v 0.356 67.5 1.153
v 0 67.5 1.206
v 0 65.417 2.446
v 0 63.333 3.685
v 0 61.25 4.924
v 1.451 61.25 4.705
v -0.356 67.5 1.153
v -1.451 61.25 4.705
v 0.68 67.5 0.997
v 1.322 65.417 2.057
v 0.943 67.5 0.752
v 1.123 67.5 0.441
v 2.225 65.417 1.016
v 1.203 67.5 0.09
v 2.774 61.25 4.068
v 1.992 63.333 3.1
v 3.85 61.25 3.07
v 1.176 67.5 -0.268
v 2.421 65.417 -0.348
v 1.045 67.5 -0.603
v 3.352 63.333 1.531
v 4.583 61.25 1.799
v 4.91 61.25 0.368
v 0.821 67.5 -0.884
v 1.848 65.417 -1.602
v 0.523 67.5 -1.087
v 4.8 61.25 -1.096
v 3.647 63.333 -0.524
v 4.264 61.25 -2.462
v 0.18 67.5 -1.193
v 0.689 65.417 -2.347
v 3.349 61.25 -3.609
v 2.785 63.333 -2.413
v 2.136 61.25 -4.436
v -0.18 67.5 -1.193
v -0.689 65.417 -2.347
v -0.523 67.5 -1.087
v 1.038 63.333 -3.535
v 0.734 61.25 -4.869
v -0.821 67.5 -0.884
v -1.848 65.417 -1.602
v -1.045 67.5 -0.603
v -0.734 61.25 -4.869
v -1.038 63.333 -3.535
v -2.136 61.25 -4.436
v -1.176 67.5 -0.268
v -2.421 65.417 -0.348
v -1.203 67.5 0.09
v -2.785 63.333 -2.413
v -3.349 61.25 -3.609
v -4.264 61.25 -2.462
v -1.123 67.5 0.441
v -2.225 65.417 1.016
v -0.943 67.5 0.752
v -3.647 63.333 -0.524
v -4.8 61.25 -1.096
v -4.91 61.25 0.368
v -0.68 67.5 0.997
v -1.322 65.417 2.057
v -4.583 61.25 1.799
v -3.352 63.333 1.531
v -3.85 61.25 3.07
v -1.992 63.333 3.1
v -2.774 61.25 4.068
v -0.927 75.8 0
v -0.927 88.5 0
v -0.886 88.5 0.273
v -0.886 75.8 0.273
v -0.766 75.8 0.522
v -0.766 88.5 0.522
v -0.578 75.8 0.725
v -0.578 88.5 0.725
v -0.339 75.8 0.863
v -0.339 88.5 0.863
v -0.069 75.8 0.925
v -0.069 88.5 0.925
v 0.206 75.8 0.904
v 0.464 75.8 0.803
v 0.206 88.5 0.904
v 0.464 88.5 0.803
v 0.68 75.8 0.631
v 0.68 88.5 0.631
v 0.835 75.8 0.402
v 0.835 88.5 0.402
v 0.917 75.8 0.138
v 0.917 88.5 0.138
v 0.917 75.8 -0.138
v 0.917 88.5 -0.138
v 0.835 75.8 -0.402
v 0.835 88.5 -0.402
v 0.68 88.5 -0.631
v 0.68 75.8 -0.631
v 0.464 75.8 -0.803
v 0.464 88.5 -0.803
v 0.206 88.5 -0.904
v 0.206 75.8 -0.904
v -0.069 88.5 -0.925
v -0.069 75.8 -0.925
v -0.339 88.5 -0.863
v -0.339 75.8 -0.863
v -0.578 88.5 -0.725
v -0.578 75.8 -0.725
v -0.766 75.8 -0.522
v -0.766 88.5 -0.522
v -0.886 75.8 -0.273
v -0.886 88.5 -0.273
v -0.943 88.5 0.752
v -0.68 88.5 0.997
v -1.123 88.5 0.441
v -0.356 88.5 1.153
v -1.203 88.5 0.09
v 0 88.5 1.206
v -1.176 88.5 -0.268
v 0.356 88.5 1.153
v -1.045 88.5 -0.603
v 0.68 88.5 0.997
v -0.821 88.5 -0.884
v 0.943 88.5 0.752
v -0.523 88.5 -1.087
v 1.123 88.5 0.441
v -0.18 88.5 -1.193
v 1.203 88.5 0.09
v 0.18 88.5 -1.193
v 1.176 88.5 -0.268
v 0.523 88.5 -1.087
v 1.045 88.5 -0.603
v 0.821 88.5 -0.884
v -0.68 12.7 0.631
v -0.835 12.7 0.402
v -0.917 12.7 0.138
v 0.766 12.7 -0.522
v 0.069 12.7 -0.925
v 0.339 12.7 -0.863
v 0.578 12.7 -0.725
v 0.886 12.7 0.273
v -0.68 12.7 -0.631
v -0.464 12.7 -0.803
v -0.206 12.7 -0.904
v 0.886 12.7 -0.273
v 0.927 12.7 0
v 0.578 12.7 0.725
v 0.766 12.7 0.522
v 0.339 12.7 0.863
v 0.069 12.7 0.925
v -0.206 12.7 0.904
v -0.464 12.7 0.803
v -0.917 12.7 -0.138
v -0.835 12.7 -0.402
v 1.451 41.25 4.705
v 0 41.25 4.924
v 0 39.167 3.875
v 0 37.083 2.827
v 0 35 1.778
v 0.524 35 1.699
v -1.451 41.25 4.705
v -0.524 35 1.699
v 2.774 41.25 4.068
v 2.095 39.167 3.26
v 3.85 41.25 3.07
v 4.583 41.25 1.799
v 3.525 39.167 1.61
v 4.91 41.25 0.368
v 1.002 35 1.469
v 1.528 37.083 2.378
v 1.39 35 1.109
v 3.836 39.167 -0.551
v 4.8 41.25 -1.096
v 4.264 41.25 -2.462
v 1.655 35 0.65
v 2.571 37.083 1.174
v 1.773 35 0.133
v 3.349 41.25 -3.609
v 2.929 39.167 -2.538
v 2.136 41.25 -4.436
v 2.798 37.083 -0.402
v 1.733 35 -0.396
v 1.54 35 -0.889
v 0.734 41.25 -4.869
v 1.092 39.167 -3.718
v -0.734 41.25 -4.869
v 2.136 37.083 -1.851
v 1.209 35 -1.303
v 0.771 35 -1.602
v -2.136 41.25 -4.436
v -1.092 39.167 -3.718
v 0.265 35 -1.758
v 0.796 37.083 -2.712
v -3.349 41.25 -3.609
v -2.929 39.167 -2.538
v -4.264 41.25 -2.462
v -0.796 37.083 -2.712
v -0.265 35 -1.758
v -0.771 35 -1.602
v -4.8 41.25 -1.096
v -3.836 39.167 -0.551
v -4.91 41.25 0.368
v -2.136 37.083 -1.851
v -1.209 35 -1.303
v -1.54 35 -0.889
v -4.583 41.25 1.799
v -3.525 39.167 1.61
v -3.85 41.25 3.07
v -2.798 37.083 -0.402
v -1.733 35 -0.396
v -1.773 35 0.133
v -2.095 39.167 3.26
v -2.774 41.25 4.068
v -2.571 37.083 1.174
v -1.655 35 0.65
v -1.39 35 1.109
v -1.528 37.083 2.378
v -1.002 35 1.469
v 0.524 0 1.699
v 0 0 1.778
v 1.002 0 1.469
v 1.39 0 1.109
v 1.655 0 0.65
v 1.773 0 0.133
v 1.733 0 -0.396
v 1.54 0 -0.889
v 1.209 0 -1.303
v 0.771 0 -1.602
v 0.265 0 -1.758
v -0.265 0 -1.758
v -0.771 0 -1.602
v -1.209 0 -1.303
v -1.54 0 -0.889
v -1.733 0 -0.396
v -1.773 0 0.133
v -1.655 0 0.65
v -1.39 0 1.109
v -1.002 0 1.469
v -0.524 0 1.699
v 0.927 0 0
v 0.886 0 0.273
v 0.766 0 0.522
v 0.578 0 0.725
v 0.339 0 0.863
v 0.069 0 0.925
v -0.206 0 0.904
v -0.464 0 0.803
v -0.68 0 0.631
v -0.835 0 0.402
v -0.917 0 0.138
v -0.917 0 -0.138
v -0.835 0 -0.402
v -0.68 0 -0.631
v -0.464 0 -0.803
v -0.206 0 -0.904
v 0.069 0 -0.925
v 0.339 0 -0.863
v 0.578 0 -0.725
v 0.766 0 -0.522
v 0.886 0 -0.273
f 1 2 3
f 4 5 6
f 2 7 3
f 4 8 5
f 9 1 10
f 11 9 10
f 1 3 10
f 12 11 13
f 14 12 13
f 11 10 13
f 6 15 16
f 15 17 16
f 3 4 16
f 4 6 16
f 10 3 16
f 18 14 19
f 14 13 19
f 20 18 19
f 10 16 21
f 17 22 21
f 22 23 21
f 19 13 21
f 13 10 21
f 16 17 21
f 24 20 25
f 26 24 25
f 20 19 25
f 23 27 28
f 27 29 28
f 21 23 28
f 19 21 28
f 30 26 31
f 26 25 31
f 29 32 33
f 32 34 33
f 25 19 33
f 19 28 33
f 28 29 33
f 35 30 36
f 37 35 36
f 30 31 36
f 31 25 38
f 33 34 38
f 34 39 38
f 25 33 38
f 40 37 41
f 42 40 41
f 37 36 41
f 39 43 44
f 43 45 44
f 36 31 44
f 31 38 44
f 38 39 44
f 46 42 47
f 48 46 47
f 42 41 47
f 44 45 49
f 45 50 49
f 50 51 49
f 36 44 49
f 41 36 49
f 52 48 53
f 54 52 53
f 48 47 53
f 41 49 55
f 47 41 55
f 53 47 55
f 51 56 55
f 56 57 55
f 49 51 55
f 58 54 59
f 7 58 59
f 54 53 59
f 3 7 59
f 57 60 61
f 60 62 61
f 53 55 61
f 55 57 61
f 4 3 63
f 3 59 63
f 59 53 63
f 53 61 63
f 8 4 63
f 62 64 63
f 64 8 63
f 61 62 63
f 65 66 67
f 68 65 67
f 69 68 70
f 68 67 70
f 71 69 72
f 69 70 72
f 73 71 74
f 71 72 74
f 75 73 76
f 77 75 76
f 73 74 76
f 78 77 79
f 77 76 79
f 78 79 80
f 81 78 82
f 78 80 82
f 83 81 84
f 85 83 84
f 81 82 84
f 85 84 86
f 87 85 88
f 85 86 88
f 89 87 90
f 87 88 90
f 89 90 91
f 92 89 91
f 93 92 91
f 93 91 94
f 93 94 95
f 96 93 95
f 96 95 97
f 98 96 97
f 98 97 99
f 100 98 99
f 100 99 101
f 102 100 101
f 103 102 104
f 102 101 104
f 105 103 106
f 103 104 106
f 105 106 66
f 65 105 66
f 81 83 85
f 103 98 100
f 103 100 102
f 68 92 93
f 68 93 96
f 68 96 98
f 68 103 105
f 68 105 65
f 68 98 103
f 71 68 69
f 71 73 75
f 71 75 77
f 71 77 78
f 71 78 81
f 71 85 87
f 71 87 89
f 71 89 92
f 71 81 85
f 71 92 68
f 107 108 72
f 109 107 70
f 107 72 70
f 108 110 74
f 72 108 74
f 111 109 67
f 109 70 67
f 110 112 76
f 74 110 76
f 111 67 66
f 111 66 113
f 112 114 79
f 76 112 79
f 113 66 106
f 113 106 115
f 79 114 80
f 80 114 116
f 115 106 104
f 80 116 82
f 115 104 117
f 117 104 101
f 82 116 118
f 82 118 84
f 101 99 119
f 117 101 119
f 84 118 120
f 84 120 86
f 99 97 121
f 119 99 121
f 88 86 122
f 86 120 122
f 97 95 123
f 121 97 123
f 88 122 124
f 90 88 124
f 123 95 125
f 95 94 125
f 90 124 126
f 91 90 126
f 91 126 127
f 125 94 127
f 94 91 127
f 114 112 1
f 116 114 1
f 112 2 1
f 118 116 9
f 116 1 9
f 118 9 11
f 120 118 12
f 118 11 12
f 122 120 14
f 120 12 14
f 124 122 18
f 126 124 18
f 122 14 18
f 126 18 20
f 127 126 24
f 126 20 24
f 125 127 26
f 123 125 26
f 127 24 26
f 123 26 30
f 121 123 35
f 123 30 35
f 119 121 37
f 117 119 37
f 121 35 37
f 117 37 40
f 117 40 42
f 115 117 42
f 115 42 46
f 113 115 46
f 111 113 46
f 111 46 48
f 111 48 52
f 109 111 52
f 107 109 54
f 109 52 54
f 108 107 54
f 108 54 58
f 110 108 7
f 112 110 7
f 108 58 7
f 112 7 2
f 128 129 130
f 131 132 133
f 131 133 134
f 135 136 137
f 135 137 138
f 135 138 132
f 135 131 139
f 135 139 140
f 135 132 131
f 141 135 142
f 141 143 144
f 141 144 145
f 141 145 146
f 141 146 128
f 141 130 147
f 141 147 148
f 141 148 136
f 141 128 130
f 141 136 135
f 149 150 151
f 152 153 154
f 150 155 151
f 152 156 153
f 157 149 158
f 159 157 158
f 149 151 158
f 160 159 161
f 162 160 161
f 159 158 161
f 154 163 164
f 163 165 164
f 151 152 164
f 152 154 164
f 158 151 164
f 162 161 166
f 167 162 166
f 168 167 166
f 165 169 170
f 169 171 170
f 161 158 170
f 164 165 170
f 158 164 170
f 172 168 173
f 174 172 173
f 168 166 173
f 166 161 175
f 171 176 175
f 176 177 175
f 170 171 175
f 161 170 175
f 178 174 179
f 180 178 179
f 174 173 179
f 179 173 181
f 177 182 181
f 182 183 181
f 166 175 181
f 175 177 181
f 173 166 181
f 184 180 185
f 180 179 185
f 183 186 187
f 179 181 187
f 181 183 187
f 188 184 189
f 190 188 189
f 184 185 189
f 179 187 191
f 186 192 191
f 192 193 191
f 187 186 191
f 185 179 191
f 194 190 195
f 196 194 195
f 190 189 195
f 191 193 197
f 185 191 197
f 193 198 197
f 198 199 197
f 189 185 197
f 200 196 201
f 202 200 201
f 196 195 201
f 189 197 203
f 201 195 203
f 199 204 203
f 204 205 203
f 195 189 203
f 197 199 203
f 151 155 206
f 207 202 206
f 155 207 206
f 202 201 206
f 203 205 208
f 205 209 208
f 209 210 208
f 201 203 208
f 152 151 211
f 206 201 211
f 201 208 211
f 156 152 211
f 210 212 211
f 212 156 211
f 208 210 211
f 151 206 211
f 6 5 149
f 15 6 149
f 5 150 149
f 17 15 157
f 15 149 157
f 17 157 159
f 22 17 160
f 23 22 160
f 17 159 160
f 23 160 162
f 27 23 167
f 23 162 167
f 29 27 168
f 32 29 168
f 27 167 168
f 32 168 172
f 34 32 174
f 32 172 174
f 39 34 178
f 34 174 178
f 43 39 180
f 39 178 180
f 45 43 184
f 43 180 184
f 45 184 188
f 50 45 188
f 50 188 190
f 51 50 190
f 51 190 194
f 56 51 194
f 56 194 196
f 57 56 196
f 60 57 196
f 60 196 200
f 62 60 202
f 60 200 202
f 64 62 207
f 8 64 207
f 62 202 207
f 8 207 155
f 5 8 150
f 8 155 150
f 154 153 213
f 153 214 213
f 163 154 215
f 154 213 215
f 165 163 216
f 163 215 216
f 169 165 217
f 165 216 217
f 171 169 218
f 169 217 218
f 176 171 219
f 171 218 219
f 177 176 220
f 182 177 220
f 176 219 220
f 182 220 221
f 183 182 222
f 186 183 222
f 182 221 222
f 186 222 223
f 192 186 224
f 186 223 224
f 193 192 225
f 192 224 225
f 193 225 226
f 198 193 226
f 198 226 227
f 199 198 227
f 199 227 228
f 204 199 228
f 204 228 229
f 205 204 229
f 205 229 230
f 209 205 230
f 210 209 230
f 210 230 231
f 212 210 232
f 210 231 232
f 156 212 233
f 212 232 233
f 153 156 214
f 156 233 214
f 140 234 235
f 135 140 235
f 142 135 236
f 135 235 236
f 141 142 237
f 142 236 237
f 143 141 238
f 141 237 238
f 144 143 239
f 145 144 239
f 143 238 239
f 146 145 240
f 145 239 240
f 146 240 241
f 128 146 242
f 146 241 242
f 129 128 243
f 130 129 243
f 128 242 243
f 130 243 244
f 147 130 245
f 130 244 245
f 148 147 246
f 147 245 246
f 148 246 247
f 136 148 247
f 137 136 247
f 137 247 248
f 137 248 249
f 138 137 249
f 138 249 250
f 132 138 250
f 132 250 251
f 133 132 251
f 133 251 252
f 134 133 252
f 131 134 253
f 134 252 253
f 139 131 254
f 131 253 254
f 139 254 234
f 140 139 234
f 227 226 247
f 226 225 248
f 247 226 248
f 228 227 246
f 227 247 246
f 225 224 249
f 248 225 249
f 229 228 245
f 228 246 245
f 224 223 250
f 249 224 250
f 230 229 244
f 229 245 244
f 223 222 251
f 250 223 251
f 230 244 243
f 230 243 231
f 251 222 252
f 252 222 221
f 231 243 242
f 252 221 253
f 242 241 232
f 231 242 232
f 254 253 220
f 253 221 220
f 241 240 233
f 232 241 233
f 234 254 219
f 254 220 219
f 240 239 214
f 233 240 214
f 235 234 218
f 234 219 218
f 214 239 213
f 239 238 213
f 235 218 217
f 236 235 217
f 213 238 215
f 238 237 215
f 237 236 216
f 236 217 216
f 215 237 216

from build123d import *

# Parameters (mm, degrees)
F2_R     = 0.9271
F3_DEPTH = 12.7
F4_R     = 0.9271
F5_DEPTH = 12.7


with BuildPart() as f1:
    # F0 (on Right) → F1 (revolve)
    with BuildSketch(Plane.YZ):
        Polygon((0, 1.778), (0, 0), (88.5, 0), (88.5, 1.2065), (67.5, 1.2065), (61.25, 4.9238), (41.25, 4.9238), (35, 1.778), align=None)
    revolve(axis=Axis((0, 44.25, 0), (0, 1, 0)))

    # F2 (on face) → F3 (cut)
    with BuildSketch(Plane(origin=(0, 88.5, 0), x_dir=(-1, 0, 0), z_dir=(0, 1, 0))):
        Circle(F2_R)
    extrude(amount=-F3_DEPTH, mode=Mode.SUBTRACT)

    # F4 (on face) → F5 (cut)
    with BuildSketch(Plane.XZ):
        Circle(F4_R)
    extrude(amount=-F5_DEPTH, mode=Mode.SUBTRACT)


solid = f1.part
